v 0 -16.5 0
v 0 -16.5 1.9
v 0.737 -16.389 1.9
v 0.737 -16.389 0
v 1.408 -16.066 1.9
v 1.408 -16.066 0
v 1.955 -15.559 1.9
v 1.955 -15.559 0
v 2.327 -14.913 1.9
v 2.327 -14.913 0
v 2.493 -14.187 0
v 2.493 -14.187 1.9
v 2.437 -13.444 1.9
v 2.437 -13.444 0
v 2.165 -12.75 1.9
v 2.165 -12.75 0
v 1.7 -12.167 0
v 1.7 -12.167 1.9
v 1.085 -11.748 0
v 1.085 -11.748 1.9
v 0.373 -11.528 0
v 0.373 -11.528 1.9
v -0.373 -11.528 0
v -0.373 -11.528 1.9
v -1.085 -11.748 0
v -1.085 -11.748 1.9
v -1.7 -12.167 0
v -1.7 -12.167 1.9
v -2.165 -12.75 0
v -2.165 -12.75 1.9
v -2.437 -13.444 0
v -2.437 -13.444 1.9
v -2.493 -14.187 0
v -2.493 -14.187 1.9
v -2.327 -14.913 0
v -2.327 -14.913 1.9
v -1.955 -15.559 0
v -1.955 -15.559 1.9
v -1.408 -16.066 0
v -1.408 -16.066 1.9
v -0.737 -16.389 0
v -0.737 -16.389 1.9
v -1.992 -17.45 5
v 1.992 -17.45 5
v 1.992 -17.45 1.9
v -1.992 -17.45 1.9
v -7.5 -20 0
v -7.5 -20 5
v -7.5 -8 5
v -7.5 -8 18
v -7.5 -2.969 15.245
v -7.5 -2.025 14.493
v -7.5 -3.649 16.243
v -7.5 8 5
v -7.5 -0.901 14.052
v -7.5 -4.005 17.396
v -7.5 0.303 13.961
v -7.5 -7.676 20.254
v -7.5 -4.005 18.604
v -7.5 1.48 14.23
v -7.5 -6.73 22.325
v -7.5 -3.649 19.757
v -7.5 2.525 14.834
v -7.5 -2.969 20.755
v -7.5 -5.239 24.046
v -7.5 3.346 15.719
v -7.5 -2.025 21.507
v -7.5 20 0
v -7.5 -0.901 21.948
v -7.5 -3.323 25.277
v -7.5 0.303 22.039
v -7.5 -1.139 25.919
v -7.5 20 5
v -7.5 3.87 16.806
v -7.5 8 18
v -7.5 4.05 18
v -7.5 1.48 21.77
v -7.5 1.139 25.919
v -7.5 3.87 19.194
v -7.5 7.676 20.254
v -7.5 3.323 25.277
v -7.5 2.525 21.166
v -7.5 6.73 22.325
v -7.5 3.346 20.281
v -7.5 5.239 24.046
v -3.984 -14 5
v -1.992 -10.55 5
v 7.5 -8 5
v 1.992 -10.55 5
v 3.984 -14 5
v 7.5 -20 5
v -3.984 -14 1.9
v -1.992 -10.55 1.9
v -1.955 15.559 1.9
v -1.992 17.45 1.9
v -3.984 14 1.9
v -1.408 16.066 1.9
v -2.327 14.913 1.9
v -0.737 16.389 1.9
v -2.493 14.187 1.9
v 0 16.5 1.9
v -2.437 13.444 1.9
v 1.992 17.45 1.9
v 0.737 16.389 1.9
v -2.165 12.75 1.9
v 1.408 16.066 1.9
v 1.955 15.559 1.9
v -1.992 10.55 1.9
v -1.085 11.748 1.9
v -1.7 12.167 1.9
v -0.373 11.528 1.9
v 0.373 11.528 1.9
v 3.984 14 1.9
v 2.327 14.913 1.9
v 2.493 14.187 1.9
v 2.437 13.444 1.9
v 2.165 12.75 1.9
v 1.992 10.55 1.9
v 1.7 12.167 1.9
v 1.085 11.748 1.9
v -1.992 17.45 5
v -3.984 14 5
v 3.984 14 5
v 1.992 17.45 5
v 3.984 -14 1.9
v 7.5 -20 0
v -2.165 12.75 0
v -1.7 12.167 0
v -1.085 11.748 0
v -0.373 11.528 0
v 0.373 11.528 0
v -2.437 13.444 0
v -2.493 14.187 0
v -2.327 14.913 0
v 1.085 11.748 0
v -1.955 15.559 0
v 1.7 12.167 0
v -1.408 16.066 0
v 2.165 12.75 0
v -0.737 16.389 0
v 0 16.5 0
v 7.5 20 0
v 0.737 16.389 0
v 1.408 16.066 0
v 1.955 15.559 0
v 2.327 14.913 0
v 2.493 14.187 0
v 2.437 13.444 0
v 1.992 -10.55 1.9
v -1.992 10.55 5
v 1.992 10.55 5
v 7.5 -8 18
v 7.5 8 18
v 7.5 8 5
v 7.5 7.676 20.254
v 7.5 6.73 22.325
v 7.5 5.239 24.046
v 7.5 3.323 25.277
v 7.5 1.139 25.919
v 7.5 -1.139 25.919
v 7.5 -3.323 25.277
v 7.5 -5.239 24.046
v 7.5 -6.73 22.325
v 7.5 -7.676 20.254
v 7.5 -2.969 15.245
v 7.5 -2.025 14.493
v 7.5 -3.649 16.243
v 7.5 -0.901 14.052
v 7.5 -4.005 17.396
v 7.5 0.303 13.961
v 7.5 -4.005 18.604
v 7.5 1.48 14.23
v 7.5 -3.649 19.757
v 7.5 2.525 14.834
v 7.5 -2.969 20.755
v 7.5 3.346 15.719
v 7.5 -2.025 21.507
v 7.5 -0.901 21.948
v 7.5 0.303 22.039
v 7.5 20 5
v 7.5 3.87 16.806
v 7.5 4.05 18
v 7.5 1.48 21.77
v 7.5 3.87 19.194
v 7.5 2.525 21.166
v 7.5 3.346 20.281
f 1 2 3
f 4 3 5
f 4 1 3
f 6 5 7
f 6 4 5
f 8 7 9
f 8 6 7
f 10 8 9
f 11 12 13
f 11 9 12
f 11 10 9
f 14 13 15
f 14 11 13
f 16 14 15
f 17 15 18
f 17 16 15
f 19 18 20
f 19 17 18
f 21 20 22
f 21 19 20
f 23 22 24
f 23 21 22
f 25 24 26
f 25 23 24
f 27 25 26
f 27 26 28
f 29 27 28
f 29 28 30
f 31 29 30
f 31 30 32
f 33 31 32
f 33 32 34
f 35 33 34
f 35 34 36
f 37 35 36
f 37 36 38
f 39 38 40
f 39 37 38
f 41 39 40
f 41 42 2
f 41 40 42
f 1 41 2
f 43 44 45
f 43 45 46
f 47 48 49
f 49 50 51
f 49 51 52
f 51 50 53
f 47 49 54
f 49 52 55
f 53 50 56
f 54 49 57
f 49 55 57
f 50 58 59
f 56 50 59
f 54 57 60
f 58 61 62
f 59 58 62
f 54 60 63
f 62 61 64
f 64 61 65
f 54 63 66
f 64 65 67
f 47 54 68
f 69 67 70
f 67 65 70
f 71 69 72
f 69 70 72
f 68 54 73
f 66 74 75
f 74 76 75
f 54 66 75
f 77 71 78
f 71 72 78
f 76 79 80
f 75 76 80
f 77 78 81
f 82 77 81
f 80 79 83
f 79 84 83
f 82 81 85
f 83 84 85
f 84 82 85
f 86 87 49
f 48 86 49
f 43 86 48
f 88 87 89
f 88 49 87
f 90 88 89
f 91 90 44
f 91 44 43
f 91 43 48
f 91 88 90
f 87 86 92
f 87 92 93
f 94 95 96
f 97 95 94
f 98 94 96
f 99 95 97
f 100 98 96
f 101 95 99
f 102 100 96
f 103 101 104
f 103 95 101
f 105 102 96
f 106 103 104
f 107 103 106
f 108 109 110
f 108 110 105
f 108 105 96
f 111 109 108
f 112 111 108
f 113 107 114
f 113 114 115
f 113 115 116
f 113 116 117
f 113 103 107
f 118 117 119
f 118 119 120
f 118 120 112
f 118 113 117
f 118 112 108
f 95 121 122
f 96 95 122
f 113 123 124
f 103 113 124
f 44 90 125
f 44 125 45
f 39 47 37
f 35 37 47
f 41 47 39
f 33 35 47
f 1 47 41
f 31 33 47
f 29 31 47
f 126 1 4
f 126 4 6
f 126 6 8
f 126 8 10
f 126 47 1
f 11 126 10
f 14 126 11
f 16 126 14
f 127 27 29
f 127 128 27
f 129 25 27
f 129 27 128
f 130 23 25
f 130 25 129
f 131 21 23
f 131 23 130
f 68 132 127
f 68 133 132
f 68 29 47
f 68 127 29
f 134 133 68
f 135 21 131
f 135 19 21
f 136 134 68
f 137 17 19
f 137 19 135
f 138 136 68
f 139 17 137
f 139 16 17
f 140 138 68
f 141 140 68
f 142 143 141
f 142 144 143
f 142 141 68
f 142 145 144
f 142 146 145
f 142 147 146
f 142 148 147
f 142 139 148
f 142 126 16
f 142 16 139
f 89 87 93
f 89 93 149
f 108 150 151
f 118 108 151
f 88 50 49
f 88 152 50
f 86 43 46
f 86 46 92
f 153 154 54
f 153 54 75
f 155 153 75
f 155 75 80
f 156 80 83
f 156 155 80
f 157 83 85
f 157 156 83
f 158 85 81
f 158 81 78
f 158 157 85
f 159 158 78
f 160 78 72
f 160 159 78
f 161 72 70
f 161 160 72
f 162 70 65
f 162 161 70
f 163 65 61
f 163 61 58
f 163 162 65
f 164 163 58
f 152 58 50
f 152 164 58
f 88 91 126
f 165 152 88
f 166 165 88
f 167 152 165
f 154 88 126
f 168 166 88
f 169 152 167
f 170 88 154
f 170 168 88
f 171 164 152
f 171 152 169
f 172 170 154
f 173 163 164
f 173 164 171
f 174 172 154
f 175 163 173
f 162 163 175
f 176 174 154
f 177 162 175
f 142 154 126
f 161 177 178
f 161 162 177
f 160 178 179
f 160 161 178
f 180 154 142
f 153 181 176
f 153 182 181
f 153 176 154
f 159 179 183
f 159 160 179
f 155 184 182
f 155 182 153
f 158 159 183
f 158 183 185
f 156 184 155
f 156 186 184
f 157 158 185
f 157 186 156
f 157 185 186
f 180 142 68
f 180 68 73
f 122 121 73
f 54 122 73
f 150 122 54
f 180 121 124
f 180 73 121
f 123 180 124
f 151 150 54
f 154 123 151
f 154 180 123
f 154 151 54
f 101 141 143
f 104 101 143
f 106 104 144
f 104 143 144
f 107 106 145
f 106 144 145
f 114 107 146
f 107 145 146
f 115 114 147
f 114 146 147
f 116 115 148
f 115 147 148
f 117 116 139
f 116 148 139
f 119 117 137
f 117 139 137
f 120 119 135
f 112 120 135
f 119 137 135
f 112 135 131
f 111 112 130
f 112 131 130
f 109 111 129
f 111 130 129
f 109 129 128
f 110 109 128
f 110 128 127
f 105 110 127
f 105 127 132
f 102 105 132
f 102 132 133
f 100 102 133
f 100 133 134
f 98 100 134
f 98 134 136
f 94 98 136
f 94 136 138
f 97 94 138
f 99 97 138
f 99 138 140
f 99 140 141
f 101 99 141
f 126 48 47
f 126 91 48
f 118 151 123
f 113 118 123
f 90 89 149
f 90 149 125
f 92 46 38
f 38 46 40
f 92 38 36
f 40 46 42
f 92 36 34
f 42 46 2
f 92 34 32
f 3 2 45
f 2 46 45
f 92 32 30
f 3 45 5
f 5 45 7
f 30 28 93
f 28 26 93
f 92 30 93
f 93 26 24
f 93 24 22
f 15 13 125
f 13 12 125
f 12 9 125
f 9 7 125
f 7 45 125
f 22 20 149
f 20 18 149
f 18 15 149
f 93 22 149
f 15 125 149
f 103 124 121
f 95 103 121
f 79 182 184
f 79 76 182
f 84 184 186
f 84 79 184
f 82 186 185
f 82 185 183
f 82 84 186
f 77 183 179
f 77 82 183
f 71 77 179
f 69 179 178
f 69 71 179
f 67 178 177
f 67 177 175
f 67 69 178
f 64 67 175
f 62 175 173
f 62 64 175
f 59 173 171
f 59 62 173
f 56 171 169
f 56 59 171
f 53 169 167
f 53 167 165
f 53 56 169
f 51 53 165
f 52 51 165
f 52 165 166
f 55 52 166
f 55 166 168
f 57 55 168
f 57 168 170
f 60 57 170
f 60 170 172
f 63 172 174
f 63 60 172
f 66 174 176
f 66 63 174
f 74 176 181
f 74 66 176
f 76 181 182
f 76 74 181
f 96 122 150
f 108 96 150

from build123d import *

# Parameters (mm, degrees)
SKETCH_R        = 4.05
PAD_DEPTH       = 7.5
POCKET_DEPTH    = 3.1
SKETCH002_R     = 2.5
POCKET001_DEPTH = 126.020998


with BuildPart() as part:
    # Sketch → Pad (new body, symmetric)
    with BuildSketch(Plane.YZ):
        with BuildLine():
            Line((-20, 0), (20, 0))
            Line((20, 0), (20, 5))
            Line((20, 5), (8, 5))
            Line((8, 5), (8, 18))
            ThreePointArc((8, 18), (0, 26), (-8, 18))
            Line((-8, 18), (-8, 5))
            Line((-8, 5), (-20, 5))
            Line((-20, 5), (-20, 0))
        make_face()
        with Locations((0, 18)):
            Circle(SKETCH_R, mode=Mode.SUBTRACT)
    extrude(amount=PAD_DEPTH, both=True)

    # Sketch001 (on Face7 of Pad) → Pocket (cut)
    with BuildSketch(Plane(origin=(0, 0, 5), x_dir=(0, -1, 0), z_dir=(0, 0, 1))):
        Polygon((-10.55, 1.991858), (-14, 3.983717), (-17.45, 1.991858), (-17.45, -1.991858), (-14, -3.983717), (-10.55, -1.991858), align=None)
    pocket = extrude(amount=-POCKET_DEPTH, mode=Mode.SUBTRACT)

    # Sketch002 (on Face1 of Pocket) → Pocket001 (cut, through all)
    with BuildSketch(Plane.YX):
        with Locations((14, 0)):
            Circle(SKETCH002_R)
    pocket001 = extrude(amount=-POCKET001_DEPTH, mode=Mode.SUBTRACT)

    # Mirrored: Pocket, Pocket001 across XZ
    add(pocket.mirror(Plane.XZ), mode=Mode.SUBTRACT)
    add(pocket001.mirror(Plane.XZ), mode=Mode.SUBTRACT)


solid = part.part
